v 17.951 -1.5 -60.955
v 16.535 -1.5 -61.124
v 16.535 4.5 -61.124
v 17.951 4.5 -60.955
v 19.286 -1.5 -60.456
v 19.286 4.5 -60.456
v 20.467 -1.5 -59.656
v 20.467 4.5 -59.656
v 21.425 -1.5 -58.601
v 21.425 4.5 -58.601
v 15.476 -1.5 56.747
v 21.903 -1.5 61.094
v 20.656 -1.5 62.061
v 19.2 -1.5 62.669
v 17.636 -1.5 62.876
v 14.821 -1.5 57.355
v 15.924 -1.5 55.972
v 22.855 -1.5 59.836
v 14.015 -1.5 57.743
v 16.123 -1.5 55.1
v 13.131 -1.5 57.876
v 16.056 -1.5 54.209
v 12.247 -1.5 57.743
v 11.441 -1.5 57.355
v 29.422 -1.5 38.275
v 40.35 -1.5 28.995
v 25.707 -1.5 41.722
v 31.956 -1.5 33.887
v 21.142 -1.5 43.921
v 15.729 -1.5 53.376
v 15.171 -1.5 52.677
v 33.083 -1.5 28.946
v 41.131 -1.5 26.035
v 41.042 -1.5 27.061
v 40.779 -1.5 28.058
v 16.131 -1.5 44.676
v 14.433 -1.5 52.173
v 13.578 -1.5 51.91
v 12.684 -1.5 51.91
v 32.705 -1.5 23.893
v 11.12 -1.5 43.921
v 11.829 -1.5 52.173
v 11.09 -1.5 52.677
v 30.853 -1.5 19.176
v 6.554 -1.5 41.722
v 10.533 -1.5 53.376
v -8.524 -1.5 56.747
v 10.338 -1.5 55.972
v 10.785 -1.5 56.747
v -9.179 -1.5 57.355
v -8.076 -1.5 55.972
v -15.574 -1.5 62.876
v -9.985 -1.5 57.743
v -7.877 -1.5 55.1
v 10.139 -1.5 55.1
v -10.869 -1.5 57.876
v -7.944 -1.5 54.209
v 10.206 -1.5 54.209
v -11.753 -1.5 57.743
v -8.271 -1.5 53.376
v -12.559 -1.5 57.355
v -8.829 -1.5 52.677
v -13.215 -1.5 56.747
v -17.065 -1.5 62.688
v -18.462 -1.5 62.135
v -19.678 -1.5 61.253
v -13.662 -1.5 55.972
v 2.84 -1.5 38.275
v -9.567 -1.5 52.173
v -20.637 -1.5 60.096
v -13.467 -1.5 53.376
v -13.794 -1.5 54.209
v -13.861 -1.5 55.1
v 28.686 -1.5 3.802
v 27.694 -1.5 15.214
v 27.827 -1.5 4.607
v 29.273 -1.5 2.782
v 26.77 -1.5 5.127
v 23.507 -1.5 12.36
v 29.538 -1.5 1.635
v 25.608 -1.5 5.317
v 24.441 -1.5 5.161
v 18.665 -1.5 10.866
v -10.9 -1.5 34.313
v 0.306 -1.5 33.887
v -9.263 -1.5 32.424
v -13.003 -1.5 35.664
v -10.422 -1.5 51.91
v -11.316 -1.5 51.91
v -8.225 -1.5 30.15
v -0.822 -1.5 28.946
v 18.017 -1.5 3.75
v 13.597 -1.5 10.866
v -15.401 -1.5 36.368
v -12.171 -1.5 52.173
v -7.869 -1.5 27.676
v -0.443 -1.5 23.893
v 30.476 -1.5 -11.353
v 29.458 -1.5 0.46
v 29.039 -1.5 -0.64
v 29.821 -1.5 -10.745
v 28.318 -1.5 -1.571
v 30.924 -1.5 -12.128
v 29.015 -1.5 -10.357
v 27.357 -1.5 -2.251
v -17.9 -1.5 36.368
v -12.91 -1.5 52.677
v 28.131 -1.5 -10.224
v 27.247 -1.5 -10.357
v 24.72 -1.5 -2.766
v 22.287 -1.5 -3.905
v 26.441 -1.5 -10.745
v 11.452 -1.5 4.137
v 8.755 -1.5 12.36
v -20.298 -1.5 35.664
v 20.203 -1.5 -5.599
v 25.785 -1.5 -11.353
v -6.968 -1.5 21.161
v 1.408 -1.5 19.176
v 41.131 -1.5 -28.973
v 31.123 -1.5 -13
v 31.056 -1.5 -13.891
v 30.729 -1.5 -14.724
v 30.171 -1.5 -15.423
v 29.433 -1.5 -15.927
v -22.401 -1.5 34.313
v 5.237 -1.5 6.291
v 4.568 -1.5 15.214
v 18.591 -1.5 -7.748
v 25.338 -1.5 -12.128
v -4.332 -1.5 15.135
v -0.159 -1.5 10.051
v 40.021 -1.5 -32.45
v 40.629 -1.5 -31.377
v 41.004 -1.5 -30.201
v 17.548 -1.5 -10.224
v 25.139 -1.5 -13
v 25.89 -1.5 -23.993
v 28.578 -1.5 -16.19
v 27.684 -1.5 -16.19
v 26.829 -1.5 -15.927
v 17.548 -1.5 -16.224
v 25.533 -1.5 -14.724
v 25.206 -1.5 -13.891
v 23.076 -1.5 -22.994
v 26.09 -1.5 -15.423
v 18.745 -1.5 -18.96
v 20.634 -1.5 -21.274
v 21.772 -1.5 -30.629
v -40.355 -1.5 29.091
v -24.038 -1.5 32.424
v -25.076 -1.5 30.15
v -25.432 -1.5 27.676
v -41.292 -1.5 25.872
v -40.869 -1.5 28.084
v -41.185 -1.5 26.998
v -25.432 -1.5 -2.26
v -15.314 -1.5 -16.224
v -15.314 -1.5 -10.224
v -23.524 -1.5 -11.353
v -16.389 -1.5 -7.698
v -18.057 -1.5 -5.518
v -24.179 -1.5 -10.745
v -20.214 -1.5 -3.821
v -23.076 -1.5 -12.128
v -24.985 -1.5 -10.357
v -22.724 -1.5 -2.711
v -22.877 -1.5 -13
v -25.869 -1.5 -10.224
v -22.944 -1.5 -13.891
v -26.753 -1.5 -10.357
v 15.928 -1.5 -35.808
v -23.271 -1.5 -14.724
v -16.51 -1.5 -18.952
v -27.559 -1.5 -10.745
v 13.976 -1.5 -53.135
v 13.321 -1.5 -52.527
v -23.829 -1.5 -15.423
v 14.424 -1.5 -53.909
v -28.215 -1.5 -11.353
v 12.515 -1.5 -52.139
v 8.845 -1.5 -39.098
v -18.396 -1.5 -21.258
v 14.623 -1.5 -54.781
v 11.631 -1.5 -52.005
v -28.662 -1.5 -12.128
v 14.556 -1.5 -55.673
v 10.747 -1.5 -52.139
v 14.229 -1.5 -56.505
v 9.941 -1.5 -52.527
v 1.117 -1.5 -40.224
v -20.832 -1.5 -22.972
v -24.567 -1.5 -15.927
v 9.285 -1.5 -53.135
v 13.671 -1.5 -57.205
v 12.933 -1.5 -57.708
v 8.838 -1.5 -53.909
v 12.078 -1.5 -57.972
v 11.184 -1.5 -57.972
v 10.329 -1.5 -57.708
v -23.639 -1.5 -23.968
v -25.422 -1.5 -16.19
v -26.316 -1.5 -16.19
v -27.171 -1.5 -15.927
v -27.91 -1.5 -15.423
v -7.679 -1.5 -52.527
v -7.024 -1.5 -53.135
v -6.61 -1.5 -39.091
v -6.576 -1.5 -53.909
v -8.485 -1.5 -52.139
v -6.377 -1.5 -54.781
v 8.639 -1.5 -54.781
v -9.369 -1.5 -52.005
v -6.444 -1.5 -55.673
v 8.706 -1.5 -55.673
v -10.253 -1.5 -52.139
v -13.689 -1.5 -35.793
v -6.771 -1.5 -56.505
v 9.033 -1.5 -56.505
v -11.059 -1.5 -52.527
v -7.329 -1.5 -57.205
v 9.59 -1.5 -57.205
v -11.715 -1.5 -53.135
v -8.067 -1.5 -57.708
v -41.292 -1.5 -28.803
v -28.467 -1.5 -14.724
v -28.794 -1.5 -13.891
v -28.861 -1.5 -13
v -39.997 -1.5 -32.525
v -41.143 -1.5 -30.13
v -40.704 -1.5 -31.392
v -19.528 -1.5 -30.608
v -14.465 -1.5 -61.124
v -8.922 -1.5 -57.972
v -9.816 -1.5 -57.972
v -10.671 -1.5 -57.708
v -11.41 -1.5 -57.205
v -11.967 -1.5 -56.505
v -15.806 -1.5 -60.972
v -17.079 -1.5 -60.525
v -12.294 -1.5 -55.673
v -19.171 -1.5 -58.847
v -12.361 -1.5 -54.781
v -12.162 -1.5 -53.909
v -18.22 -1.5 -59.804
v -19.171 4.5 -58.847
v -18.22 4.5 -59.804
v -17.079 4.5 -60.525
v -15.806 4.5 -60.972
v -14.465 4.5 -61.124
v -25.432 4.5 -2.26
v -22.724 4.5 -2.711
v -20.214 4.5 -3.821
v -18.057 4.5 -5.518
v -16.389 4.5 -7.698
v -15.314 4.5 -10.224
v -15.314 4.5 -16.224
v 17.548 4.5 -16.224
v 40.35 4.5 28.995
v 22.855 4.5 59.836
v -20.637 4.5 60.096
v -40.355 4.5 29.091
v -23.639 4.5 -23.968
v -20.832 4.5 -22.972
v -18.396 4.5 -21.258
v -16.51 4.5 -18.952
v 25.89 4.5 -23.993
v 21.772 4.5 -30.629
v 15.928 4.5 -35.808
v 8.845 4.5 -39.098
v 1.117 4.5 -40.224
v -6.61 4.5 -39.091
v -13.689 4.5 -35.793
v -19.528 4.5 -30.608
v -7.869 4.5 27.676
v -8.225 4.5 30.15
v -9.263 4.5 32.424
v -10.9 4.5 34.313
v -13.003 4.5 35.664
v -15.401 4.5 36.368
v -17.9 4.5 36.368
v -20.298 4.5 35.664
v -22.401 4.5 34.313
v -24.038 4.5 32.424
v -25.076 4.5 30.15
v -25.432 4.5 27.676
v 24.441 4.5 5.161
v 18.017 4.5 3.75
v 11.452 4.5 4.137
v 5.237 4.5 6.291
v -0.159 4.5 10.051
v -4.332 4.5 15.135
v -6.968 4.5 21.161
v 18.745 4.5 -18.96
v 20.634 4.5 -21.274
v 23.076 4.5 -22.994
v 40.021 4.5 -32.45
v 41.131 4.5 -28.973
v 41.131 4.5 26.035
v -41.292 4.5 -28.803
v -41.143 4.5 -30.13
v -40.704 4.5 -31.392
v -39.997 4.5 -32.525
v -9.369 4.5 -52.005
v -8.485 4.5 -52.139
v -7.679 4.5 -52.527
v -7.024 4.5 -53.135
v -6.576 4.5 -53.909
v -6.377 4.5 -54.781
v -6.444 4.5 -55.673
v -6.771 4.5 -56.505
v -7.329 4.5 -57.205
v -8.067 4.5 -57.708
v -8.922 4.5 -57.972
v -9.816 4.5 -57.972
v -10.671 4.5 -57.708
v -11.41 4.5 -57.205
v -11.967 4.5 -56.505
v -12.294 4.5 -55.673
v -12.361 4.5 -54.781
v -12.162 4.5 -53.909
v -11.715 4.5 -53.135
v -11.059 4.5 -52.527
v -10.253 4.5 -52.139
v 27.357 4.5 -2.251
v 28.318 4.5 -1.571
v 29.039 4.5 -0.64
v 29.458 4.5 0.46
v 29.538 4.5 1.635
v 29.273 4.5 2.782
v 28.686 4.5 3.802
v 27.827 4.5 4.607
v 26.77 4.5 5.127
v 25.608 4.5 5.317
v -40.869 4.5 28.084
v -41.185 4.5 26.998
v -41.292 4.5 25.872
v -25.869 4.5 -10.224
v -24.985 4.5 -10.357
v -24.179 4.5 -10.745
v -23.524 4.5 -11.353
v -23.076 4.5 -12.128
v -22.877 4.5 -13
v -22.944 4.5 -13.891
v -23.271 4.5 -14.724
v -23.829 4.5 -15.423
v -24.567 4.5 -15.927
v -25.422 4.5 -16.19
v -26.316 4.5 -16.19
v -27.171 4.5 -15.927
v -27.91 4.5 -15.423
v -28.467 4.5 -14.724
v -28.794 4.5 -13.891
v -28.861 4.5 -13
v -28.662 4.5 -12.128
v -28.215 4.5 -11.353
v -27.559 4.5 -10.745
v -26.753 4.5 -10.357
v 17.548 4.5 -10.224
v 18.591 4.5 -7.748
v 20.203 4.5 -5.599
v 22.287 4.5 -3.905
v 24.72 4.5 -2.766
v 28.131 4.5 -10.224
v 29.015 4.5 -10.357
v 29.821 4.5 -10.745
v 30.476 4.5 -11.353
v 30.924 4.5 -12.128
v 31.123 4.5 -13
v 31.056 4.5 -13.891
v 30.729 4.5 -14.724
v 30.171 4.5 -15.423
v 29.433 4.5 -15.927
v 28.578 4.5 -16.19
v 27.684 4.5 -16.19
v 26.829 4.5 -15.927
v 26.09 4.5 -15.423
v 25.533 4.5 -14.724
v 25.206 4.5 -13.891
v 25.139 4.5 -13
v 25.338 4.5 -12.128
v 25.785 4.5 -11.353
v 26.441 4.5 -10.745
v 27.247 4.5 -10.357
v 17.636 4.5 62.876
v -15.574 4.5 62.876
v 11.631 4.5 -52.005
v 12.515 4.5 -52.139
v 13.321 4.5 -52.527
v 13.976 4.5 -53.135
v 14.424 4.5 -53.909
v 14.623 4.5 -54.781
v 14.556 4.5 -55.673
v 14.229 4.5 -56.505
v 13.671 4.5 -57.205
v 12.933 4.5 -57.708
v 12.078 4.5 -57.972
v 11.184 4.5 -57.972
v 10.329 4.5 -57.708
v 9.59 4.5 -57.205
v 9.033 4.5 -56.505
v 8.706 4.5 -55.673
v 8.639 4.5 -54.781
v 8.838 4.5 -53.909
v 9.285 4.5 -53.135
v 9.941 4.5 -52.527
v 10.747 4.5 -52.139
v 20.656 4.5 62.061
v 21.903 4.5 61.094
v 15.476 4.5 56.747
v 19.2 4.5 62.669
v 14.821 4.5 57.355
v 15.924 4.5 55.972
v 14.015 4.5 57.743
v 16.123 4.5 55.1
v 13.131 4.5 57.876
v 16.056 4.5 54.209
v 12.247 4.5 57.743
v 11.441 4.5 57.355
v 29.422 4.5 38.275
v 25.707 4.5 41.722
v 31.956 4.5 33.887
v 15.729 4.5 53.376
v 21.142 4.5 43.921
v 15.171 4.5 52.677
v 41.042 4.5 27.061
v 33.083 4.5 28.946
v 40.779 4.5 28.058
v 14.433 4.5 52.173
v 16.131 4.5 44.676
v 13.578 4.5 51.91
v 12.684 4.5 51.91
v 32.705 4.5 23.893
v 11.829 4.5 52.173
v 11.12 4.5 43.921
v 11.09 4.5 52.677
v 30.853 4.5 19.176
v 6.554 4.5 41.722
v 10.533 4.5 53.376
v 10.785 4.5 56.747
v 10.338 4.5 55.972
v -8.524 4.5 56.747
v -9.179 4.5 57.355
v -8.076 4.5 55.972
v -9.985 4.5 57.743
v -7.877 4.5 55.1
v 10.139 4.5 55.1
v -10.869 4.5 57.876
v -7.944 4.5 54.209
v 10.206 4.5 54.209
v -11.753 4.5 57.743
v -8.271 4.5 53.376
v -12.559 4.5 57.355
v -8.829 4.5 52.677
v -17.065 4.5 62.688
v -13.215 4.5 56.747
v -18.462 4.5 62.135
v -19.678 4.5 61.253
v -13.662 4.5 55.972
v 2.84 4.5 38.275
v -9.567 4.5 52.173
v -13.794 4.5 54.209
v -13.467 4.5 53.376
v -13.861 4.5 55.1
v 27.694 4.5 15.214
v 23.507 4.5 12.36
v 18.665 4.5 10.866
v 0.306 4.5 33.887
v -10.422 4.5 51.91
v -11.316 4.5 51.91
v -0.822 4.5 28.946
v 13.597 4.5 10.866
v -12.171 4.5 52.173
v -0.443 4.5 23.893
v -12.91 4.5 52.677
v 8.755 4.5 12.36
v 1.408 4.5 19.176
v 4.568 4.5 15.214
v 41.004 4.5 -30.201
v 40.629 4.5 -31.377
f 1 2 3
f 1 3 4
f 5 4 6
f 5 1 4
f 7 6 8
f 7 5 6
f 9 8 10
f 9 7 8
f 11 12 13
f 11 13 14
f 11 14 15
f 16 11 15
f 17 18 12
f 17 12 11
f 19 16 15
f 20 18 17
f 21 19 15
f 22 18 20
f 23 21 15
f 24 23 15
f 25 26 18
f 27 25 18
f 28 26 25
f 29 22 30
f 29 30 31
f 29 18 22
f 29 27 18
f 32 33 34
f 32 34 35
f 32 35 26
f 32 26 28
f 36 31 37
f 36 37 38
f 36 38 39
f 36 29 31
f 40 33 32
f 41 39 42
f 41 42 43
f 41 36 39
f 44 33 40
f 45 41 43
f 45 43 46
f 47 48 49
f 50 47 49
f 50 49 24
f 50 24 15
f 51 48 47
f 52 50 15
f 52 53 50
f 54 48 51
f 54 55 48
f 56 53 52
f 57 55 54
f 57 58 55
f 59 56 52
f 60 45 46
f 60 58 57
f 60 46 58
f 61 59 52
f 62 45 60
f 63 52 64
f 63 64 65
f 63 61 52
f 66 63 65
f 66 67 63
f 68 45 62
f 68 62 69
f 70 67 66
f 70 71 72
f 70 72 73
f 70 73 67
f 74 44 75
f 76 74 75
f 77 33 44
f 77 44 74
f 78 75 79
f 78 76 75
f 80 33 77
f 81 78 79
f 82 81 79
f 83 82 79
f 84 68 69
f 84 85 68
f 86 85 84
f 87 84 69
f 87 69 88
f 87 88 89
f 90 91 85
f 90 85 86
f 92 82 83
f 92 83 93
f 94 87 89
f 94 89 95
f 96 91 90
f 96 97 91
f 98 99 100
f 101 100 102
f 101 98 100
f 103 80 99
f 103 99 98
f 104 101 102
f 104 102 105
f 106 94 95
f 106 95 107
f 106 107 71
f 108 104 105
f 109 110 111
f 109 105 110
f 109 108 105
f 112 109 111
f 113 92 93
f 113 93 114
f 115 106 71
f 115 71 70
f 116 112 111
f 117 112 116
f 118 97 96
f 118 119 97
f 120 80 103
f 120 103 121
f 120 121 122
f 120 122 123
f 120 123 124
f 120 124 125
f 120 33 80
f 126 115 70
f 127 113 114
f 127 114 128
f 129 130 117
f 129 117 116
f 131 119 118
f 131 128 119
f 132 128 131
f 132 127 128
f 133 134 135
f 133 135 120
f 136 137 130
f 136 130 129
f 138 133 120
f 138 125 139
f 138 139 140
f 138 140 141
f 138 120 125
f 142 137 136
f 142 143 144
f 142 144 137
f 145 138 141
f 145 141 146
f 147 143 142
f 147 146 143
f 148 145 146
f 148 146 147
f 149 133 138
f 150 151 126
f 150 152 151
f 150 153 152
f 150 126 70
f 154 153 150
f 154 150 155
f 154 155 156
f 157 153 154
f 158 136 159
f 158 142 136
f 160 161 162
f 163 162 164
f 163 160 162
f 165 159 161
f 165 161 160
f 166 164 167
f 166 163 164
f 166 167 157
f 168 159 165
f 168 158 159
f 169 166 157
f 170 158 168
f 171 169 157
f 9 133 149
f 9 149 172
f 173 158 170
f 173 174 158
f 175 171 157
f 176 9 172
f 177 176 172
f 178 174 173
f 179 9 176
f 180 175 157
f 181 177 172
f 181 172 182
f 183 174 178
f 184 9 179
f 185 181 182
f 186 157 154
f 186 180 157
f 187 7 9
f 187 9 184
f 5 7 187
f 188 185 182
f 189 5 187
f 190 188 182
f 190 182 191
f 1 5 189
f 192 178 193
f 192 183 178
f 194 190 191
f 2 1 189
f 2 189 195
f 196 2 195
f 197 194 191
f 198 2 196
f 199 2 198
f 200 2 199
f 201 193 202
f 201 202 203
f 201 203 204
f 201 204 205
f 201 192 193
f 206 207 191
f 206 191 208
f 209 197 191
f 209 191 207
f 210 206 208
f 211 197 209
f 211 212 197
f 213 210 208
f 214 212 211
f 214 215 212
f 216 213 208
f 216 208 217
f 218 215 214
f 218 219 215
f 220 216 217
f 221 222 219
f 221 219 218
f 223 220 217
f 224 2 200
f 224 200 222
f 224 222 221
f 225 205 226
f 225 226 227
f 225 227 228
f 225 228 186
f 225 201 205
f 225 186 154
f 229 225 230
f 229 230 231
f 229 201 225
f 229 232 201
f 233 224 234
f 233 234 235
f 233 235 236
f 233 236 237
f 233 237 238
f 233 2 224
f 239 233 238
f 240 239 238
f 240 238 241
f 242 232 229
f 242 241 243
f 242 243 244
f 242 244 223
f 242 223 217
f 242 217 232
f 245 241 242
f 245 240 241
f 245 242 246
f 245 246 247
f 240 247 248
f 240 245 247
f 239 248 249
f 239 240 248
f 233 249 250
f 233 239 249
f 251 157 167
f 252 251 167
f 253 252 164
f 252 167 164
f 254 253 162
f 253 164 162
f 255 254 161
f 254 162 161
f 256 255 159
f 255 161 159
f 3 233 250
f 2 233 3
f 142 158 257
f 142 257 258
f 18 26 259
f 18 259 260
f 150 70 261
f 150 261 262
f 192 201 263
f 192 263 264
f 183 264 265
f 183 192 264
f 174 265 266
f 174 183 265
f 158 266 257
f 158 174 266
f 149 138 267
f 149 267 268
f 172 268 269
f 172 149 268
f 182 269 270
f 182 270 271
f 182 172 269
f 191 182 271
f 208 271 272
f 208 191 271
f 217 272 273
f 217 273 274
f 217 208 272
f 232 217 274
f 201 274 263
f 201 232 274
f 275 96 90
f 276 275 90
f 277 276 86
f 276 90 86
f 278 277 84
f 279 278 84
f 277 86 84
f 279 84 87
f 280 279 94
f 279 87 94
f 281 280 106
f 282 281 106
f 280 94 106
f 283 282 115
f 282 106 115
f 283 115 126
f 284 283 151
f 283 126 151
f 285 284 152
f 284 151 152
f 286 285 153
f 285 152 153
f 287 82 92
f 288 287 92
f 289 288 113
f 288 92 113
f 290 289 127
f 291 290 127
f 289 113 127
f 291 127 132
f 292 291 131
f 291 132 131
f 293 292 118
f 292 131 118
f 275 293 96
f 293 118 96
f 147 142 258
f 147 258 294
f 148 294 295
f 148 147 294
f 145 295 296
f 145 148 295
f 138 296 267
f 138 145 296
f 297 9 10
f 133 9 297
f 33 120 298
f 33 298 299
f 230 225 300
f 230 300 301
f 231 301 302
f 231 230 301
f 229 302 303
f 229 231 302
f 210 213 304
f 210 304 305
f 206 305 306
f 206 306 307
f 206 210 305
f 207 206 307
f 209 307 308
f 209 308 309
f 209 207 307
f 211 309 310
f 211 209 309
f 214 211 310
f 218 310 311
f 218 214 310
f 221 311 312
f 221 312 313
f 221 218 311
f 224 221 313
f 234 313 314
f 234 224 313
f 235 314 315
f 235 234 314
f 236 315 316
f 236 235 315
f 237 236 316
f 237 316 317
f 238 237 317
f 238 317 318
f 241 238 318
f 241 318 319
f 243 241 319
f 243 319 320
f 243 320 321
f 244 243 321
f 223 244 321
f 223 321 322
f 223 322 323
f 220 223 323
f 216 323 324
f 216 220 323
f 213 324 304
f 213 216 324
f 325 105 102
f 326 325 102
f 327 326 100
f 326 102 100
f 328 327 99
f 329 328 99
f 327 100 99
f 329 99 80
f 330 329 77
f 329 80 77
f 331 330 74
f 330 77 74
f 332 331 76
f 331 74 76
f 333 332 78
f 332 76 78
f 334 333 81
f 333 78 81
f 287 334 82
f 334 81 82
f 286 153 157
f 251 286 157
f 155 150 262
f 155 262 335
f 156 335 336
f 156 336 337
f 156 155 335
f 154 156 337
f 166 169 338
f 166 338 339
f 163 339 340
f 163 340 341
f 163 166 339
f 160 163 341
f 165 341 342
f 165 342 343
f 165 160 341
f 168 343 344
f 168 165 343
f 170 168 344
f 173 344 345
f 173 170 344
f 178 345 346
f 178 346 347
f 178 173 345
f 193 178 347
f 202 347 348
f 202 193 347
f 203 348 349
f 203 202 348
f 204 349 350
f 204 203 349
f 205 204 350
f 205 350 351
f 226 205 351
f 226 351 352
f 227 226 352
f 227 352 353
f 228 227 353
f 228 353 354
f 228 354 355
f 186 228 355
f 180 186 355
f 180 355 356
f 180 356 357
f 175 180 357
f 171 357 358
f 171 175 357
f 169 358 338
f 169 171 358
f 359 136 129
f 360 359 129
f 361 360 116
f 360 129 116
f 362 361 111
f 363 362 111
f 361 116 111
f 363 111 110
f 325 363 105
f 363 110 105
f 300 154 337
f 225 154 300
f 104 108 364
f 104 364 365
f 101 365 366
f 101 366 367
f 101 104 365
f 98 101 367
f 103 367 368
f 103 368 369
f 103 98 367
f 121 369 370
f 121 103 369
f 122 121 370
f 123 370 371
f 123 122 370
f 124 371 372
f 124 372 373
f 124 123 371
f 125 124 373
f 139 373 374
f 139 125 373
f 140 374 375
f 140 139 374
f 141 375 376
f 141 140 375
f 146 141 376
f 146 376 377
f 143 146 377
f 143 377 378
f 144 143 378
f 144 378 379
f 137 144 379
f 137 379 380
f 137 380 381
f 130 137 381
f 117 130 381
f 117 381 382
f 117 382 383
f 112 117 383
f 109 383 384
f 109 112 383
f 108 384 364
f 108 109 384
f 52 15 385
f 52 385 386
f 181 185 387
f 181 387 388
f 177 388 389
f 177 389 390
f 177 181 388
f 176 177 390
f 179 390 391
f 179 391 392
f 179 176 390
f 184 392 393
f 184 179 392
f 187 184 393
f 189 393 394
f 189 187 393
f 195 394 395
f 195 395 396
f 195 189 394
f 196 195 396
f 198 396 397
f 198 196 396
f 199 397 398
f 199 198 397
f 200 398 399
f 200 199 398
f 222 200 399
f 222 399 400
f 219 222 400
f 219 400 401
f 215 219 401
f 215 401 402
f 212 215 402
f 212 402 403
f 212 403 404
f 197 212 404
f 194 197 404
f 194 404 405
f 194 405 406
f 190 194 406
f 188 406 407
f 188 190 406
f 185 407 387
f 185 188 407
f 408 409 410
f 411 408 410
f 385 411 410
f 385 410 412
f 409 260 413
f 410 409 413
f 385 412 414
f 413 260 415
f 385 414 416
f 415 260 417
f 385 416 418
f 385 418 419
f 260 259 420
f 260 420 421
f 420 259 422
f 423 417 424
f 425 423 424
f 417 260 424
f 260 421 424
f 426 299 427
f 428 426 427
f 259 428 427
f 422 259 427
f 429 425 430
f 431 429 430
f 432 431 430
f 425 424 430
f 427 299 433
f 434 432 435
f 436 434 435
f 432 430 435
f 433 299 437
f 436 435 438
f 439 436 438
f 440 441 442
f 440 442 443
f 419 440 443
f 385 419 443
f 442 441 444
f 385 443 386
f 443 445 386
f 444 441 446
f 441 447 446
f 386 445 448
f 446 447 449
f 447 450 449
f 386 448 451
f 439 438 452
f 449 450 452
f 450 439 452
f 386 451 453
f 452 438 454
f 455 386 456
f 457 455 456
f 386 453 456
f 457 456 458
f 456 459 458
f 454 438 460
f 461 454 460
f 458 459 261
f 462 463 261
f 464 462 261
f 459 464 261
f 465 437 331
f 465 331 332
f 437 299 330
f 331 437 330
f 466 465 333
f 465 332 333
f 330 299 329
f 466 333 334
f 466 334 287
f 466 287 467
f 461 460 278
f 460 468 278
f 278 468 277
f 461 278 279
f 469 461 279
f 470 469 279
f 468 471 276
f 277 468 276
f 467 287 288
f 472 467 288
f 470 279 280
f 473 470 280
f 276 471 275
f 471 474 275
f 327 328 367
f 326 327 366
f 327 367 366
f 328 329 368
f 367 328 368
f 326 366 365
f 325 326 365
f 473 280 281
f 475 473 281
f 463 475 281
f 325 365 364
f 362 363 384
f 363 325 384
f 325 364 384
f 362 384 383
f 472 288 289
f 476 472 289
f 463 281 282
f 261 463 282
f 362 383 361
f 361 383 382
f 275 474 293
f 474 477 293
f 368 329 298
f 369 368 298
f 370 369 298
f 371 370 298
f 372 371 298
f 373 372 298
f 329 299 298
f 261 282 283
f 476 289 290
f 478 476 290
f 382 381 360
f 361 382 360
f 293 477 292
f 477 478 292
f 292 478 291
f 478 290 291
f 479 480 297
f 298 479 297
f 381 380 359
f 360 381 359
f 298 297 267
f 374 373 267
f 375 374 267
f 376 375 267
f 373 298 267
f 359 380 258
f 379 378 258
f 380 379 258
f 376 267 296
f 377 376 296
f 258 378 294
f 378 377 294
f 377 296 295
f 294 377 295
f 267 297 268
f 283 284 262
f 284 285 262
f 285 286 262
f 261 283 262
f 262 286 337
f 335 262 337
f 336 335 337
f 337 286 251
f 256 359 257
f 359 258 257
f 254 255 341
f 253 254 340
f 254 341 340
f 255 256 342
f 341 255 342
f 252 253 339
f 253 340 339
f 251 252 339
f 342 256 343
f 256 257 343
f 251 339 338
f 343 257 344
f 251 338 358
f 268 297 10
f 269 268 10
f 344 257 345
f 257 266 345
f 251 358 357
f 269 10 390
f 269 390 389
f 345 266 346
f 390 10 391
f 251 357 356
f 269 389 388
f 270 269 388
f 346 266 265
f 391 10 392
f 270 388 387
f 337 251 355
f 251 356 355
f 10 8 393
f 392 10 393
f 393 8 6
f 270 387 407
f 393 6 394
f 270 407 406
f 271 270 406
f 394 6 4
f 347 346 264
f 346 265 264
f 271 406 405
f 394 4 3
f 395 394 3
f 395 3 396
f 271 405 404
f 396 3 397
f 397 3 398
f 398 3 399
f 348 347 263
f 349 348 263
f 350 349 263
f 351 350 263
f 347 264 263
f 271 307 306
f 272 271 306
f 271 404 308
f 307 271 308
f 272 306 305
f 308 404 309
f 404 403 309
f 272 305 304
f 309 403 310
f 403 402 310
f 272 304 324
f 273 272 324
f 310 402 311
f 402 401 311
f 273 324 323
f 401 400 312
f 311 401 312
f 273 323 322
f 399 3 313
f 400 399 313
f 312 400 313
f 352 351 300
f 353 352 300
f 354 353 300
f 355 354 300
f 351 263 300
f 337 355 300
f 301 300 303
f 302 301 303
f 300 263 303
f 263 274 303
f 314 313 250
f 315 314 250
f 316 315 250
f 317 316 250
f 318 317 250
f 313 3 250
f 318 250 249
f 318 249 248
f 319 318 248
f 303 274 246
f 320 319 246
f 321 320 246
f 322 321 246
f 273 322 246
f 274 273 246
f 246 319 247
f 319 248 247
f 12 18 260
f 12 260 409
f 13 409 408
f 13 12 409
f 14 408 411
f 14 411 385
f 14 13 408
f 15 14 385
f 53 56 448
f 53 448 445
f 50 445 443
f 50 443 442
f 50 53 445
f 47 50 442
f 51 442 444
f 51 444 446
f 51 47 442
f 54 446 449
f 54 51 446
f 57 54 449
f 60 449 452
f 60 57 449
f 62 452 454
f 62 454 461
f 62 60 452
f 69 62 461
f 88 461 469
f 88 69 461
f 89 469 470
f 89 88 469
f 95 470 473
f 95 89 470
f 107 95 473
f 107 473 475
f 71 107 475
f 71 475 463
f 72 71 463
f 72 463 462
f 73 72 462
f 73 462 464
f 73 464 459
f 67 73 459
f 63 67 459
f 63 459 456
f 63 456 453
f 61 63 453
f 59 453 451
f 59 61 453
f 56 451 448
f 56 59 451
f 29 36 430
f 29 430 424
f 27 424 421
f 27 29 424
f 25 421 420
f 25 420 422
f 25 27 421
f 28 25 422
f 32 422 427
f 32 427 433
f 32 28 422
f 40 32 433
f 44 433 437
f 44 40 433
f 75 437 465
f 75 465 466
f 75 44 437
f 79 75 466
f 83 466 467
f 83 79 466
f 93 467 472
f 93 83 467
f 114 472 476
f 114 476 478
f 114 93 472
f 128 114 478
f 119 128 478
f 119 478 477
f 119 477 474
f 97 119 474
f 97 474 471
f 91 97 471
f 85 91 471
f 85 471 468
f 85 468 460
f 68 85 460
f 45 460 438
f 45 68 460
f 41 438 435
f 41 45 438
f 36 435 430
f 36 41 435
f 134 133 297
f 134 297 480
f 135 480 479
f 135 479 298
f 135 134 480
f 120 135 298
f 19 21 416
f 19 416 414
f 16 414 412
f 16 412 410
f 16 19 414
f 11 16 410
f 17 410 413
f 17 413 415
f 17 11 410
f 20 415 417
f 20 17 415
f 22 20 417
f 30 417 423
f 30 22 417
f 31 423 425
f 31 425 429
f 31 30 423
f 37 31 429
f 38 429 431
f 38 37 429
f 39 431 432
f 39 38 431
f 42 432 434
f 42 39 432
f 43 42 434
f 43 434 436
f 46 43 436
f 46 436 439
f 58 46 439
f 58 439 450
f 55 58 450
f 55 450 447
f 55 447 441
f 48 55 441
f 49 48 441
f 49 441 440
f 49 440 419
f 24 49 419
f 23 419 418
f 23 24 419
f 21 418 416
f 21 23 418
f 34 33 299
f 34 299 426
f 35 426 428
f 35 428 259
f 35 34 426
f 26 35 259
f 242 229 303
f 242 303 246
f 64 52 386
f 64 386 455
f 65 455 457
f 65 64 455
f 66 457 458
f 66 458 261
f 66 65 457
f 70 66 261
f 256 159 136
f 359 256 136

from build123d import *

# Parameters (mm, degrees)
SKETCH1_R          = 8.5
SKETCH1_R_2        = 1.5
BASE_FLANGE1_DEPTH = 3
L_EK1_SCALE        = 2


# Sheet-metal steps are written as plain solids
with BuildPart() as part:
    # Sketch1 → Base-Flange1 (new body)
    with BuildSketch(Plane(origin=(0, 0, 0), x_dir=(1, 0, 0), z_dir=(0, 1, 0))):
        with BuildLine():
            Line((19.609421573, -14.059417906), (10.862109445, -29.480175346))
            ThreePointArc((10.862109445, -29.480175346), (9.762567662, -30.59234701), (8.252687872, -31))
            Line((8.252687872, -31), (-8.352599575, -31))
            ThreePointArc((-8.352599575, -31), (-9.796606082, -30.629609326), (-10.884048227, -29.609896806))
            Line((-10.884048227, -29.609896806), (-20.742852548, -14.107625594))
            ThreePointArc((-20.742852548, -14.107625594), (-21.091885276, -13.336076582), (-21.211403896, -12.497728788))
            Line((-21.211403896, -12.497728788), (-21.211403896, 14.839305313))
            ThreePointArc((-21.211403896, 14.839305313), (-21.044943633, 15.824725306), (-20.564035521, 16.700789784))
            Line((-20.564035521, 16.700789784), (-10.150833328, 29.861484472))
            ThreePointArc((-10.150833328, 29.861484472), (-9.105019706, 30.700412322), (-7.798201703, 31))
            Line((-7.798201703, 31), (7.702138241, 31))
            ThreePointArc((7.702138241, 31), (9.077698333, 30.666052219), (10.147014932, 29.738556288))
            Line((10.147014932, 29.738556288), (19.444876691, 16.663267527))
            ThreePointArc((19.444876691, 16.663267527), (19.857851472, 15.837226972), (20, 14.924711239))
            Line((20, 14.924711239), (20, -12.57924256))
            ThreePointArc((20, -12.57924256), (19.900712388, -13.344662472), (19.609421573, -14.059417906))
        make_face()
        with Locations(Location((7.5, -13.4, 0), (0, 0, 270))):
            Circle(SKETCH1_R, mode=Mode.SUBTRACT)
        with Locations(Location((6, -27, 0), (0, 0, 270))):
            Circle(SKETCH1_R_2, mode=Mode.SUBTRACT)
        with Locations(Location((-6, -27, 0), (0, 0, 270))):
            Circle(SKETCH1_R_2, mode=Mode.SUBTRACT)
        with Locations(Location((5.25, 27.940782939, 0), (0, 0, 270))):
            Circle(SKETCH1_R_2, mode=Mode.SUBTRACT)
        with Locations(Location((-5.25, 27.940782939, 0), (0, 0, 270))):
            Circle(SKETCH1_R_2, mode=Mode.SUBTRACT)
        with Locations(Location((13.5, 7.05, 0), (0, 0, 270))):
            Circle(SKETCH1_R_2, mode=Mode.SUBTRACT)
        with Locations(Location((-13.5, 7.05, 0), (0, 0, 270))):
            Circle(SKETCH1_R_2, mode=Mode.SUBTRACT)
        with BuildLine():
            Line((-13.281403896, 0), (-13.281403896, 1.567980996))
            ThreePointArc((-13.281403896, 1.567980996), (-10.106558233, 2.738982767), (-8.222660082, 5.55))
            Line((-8.222660082, 5.55), (8.208497378, 5.55))
            ThreePointArc((8.208497378, 5.55), (10.031018679, 2.781959631), (13.113110627, 1.563624456))
            ThreePointArc((13.113110627, 1.563624456), (14.07117407, -0.953003234), (11.655254401, -2.142386538))
            ThreePointArc((11.655254401, -2.142386538), (0.639353267, -3.554619032), (-4.5, -13.4))
            ThreePointArc((-4.5, -13.4), (-8.890701948, -17.790701948), (-13.281403896, -13.4))
            Line((-13.281403896, -13.4), (-13.281403896, 0))
        make_face(mode=Mode.SUBTRACT)
        with BuildLine():
            Line((-8.222660082, 8.55), (8.208497378, 8.55))
            ThreePointArc((8.208497378, 8.55), (9.751572067, 11.074833914), (12.37962963, 12.434679214))
            ThreePointArc((12.37962963, 12.434679214), (-0.006957749, 20.549998207), (-12.385173459, 12.42191571))
            ThreePointArc((-12.385173459, 12.42191571), (-9.763306163, 11.067142739), (-8.222660082, 8.55))
        make_face(mode=Mode.SUBTRACT)
    extrude(amount=BASE_FLANGE1_DEPTH)


with BuildPart() as part_1:
    # Ölçek1: scaled about (-1.130925292, 1.5, -0.876080417)
    add(part.part.scale(L_EK1_SCALE).moved(Location((1.130925292, -1.5, 0.876080417))))


solid = part_1.part
